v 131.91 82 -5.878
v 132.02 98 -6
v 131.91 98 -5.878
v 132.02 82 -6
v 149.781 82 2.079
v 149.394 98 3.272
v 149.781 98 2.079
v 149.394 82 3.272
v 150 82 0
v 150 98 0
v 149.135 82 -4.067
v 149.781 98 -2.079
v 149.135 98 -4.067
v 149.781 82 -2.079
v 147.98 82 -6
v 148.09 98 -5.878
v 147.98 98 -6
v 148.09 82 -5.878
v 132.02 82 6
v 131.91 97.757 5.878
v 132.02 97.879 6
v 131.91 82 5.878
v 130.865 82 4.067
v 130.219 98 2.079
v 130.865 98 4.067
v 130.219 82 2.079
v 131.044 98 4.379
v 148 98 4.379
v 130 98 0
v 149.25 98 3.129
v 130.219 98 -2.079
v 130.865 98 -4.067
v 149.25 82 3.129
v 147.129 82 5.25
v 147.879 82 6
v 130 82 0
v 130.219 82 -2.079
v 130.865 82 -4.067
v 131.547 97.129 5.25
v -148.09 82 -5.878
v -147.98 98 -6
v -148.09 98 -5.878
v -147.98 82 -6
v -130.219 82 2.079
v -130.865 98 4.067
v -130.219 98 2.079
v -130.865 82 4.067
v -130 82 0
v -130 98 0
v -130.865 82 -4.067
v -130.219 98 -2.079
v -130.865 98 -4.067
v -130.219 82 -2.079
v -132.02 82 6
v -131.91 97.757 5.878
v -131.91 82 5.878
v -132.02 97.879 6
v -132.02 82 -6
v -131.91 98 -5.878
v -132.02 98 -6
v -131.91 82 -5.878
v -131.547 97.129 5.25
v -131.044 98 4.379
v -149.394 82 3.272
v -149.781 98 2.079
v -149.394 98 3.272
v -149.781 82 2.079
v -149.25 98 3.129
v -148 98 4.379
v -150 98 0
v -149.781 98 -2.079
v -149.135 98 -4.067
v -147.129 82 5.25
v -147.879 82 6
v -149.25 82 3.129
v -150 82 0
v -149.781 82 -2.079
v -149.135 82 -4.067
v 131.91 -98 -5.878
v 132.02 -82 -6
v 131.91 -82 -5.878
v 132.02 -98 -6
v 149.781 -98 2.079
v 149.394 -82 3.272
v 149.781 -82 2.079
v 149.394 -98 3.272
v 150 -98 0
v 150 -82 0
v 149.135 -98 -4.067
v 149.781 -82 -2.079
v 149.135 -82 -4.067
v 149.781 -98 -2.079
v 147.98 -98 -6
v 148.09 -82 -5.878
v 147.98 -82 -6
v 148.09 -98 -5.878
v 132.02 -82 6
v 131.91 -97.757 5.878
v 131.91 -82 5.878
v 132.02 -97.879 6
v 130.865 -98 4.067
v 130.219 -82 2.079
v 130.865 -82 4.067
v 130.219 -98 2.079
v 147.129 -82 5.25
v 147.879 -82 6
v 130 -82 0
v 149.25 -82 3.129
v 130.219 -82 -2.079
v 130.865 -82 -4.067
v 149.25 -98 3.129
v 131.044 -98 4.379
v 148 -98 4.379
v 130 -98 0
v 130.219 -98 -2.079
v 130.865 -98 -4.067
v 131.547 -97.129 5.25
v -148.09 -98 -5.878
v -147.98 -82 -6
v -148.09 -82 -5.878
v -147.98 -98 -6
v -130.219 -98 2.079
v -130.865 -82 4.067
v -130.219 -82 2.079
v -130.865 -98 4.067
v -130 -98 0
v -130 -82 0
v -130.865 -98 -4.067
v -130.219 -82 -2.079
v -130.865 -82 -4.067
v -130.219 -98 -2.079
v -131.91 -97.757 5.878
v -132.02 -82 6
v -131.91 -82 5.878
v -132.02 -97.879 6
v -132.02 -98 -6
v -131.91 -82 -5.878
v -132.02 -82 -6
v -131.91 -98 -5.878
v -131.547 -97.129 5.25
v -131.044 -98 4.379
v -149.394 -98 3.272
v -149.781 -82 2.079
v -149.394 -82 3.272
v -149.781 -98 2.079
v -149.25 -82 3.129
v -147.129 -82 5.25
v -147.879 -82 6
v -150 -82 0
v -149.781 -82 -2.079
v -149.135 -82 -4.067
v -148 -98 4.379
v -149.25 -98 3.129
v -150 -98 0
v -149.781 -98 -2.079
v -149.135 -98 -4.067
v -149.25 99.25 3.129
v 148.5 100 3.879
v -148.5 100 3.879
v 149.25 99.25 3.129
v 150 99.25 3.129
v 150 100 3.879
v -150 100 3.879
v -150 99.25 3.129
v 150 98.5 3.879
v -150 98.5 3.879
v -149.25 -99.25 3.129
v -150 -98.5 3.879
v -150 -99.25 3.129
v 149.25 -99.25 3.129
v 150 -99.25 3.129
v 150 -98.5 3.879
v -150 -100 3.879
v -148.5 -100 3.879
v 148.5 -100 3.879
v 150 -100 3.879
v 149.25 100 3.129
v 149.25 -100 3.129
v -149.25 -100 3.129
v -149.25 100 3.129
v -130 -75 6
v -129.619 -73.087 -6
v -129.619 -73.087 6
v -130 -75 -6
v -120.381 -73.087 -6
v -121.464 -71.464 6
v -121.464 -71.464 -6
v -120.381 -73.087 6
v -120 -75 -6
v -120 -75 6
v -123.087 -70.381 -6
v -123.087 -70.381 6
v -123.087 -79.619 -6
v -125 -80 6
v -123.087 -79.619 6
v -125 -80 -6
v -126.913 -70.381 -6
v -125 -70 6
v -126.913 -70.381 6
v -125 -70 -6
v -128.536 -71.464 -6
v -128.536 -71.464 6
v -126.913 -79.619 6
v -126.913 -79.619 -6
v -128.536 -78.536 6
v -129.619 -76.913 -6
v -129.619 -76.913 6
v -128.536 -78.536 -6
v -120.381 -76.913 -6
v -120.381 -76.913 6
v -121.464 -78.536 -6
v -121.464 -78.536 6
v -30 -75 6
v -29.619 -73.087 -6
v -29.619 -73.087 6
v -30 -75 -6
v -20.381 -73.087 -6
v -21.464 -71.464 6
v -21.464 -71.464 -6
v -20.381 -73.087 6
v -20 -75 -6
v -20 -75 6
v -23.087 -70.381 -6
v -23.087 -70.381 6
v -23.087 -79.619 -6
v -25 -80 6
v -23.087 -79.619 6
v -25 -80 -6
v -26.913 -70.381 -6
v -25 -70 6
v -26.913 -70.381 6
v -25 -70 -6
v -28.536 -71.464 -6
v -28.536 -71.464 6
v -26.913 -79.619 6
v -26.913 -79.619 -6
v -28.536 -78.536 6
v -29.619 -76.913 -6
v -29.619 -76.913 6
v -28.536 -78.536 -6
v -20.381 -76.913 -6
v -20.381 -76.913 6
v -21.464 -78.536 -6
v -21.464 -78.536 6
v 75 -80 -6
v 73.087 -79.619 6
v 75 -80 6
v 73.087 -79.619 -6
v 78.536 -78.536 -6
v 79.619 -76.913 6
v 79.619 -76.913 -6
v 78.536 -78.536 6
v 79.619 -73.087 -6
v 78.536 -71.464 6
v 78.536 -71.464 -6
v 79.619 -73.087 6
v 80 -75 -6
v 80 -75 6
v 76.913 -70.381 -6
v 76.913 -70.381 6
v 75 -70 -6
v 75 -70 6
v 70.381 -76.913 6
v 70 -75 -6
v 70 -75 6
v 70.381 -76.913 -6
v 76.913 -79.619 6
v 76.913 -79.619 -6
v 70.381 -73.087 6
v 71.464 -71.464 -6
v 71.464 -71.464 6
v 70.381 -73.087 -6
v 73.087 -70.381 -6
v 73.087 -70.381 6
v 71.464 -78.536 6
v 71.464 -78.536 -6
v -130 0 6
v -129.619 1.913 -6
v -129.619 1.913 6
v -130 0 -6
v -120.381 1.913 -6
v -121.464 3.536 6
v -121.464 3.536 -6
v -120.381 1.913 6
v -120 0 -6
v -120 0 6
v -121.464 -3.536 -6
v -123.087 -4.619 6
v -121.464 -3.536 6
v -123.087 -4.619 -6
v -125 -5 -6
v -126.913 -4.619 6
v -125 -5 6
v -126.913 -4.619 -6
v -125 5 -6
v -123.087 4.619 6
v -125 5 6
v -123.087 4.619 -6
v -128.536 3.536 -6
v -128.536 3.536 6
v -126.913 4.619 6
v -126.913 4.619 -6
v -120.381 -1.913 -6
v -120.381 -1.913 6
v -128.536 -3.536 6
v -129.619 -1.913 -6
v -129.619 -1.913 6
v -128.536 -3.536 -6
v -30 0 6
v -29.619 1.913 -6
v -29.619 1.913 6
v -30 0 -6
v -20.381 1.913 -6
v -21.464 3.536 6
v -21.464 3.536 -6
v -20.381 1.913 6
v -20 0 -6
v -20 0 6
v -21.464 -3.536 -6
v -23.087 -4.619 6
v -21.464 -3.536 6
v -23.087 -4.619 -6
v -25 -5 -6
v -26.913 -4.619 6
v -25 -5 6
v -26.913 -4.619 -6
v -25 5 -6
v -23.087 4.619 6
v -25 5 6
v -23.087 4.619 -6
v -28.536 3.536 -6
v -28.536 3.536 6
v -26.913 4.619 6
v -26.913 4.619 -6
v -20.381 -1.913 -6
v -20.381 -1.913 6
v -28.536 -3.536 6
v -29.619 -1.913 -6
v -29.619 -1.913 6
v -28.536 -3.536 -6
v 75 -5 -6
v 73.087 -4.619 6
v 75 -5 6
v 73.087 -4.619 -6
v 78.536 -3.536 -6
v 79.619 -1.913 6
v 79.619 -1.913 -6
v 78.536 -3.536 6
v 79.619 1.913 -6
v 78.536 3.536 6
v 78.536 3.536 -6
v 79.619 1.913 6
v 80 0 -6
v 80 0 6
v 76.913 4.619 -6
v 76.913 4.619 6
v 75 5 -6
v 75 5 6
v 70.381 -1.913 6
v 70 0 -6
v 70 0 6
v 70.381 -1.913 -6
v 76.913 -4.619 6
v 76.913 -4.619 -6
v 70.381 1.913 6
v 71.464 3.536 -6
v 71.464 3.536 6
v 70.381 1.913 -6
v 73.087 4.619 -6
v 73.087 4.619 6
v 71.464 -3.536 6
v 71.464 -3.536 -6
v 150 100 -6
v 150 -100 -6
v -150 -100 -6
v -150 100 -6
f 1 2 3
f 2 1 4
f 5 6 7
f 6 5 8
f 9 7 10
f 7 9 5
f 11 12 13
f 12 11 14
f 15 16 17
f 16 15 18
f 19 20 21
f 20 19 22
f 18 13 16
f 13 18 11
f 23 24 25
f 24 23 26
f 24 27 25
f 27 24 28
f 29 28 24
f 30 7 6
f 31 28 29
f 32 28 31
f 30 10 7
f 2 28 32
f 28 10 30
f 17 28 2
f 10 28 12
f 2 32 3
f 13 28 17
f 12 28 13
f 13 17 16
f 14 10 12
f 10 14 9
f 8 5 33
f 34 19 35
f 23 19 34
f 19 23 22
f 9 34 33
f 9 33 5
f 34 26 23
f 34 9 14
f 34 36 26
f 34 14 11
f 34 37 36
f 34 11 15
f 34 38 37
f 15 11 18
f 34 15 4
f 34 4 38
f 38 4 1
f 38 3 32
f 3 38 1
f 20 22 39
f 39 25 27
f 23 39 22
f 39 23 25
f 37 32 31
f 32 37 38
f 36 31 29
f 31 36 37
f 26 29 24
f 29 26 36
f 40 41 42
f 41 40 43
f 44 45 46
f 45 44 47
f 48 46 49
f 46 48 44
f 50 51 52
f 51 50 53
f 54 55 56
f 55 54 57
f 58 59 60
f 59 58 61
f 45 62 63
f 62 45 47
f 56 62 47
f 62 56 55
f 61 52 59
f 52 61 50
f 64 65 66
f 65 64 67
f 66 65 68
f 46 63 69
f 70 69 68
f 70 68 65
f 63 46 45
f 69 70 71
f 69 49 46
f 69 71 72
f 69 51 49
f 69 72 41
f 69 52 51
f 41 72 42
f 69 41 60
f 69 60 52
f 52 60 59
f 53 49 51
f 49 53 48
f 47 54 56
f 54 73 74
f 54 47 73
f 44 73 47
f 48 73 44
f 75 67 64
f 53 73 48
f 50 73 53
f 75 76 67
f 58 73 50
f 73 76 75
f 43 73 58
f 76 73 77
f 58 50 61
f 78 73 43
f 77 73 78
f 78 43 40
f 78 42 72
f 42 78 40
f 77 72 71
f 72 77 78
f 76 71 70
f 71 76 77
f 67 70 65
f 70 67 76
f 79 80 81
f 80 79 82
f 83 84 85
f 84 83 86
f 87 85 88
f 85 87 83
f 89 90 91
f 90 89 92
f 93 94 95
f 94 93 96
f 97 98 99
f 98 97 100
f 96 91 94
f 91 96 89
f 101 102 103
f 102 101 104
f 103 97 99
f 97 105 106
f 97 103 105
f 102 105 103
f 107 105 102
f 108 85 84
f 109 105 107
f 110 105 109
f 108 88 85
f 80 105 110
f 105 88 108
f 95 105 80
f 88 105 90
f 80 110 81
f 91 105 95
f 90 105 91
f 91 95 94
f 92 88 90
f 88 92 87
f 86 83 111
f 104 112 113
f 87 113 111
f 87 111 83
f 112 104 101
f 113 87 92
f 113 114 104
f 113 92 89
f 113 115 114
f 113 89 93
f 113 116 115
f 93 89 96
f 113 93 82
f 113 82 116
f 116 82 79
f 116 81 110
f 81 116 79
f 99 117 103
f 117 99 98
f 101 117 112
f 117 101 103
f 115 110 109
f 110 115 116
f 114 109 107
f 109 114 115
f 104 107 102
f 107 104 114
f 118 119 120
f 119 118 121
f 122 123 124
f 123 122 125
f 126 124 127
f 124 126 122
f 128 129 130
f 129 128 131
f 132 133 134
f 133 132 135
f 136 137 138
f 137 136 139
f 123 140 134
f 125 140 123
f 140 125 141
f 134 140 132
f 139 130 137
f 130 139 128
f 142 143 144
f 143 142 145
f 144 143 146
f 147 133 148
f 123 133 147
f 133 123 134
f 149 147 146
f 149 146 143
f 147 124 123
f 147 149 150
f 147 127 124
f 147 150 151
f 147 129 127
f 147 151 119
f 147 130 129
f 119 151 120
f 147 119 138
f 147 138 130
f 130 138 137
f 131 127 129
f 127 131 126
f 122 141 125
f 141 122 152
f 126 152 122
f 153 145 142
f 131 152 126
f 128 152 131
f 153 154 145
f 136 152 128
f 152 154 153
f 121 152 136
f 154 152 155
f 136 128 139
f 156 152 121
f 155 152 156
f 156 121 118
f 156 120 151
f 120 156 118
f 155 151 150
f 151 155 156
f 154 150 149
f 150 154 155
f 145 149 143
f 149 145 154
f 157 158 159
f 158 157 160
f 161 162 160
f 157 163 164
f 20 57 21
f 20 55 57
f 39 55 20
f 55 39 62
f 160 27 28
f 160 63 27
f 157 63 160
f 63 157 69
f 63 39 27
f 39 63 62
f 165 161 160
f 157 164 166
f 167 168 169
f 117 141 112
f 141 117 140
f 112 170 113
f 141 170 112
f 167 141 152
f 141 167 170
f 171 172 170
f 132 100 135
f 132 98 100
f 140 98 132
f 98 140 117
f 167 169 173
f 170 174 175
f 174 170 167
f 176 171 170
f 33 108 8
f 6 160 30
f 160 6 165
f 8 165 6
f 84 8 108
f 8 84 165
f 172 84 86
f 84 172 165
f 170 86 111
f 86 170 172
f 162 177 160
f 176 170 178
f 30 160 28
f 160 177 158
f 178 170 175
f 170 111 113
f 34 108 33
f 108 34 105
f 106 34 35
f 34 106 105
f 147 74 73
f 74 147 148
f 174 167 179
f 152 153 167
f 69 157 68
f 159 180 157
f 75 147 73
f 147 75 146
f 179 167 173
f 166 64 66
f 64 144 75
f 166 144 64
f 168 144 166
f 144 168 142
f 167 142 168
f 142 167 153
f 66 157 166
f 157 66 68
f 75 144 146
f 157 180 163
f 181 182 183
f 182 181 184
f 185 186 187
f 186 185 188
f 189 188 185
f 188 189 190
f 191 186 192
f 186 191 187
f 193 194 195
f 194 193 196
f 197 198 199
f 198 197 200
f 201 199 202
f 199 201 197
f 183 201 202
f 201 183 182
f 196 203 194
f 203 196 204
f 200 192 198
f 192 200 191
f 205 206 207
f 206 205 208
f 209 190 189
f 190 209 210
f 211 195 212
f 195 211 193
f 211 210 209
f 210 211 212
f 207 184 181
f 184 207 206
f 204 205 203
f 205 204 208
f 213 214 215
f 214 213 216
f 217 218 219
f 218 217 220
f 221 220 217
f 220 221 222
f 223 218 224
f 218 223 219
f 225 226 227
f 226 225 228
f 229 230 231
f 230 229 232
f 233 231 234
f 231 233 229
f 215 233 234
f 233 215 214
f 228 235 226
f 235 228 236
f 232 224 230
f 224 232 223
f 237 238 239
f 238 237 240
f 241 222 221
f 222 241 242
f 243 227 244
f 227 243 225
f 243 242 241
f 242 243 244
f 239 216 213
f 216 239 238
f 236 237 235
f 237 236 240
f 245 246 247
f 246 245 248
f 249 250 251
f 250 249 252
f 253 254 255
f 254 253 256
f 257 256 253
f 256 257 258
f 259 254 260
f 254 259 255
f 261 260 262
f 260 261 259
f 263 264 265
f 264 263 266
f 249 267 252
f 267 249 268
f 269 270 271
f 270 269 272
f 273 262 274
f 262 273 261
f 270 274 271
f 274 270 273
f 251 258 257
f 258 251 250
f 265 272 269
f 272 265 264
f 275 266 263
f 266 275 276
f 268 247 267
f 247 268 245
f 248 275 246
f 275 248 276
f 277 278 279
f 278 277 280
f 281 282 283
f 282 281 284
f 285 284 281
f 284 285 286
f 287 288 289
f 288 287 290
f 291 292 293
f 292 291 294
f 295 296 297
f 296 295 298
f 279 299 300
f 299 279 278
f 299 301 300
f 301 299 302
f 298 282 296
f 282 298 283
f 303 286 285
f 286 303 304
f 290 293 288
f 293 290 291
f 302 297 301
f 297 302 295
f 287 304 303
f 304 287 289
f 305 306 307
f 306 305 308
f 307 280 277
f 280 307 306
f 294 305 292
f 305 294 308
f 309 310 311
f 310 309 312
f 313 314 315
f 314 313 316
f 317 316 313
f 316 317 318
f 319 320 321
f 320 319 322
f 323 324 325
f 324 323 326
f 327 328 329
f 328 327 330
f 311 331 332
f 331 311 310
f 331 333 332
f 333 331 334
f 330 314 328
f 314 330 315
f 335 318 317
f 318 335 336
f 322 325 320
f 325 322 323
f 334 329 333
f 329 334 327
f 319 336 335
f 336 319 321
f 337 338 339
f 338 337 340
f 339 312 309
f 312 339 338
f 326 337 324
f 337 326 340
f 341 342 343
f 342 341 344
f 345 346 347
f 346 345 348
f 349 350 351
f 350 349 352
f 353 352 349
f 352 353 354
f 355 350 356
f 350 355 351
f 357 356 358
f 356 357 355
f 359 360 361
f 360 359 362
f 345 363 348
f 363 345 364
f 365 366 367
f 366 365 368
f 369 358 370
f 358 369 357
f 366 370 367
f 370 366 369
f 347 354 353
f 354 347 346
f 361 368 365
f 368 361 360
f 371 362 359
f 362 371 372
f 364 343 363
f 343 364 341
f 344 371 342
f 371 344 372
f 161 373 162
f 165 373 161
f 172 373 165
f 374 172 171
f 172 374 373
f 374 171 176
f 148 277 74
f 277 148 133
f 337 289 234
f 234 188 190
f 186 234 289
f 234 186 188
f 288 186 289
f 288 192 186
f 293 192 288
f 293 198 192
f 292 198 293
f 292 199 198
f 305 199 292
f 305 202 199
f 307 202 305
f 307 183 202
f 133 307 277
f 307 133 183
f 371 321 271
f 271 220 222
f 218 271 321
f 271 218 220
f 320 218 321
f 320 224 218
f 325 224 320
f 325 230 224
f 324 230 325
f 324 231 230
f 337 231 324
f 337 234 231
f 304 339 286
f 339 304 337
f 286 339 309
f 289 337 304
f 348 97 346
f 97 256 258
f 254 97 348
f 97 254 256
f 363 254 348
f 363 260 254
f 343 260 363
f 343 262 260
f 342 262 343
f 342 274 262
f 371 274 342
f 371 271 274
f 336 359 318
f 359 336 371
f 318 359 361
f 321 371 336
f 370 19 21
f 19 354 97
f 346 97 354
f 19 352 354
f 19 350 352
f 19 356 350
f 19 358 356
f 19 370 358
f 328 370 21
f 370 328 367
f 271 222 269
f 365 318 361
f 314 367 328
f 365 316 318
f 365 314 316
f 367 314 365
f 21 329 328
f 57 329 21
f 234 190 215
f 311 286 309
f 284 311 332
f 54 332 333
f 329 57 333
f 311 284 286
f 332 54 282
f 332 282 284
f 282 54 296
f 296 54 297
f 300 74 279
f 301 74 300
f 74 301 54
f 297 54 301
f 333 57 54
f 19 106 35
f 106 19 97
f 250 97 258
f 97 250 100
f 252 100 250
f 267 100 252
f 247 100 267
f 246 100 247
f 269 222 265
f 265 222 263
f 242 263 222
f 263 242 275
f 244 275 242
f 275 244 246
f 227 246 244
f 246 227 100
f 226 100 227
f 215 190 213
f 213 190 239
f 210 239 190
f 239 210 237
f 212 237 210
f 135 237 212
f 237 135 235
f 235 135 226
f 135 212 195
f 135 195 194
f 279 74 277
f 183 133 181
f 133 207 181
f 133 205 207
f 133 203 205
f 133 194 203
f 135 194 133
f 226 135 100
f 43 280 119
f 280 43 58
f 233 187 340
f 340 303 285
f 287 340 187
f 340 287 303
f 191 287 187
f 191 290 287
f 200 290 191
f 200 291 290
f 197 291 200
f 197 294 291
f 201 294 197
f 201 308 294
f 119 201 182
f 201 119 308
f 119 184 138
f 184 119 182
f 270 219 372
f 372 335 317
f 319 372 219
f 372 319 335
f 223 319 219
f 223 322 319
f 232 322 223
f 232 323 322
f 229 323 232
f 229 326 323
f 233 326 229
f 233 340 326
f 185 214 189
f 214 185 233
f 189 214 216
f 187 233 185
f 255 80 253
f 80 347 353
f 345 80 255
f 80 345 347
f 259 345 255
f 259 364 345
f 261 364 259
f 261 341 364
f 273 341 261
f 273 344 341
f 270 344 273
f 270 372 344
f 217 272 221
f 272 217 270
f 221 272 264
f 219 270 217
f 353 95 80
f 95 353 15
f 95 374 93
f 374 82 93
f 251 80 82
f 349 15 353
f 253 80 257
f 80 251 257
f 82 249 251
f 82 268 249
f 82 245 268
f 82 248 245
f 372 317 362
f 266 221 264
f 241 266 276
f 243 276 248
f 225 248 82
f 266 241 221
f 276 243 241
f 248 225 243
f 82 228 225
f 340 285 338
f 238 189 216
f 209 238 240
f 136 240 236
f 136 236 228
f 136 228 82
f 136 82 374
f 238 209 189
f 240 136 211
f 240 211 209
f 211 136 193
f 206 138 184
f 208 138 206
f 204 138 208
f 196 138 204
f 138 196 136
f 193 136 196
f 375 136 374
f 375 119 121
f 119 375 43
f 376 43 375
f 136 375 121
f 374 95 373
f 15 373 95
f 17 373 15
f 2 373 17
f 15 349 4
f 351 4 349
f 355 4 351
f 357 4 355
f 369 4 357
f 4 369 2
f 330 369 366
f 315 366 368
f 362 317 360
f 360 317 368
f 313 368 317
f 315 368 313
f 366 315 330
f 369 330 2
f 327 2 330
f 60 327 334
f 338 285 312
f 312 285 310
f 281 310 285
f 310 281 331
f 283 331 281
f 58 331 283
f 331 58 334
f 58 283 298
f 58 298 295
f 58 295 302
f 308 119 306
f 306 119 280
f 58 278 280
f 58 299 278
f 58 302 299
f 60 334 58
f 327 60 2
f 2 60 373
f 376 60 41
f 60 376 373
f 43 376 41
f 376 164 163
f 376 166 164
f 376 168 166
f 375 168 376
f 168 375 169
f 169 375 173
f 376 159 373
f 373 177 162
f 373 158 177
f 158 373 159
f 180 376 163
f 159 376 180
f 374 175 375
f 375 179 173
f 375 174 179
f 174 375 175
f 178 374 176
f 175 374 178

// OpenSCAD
// Parameters
plate_length = 300; //[150:600:1]
plate_width = 200; //[100:400:1]
plate_thickness = 12; //[6:24:1]
corner_radius = 10; //[5:20:1]
edge_chamfer = 1.5; //[0.5:3:0.5]
hole_diameter = 10; //[5:20:1]
hole_edge_margin = 25; //[12:50:1]
hole_spacing_x = 100; //[50:200:1]
hole_spacing_y = 75; //[40:150:1]
hole_rows = 2; //[1:4:1]
hole_cols = 3; //[1:5:1]
hole_clearance_z = 2; //[1:5:1]
chamfer_cutter_extra = 2; //[1:6:1]

// Base shapes
module tooling_plate_body() {
  cube([plate_length, plate_width, plate_thickness], center=true);
}

module corner_radius_cut_cyl_base() {
  rotate([90, 0, 0])
    cylinder(r=corner_radius, h=plate_thickness + 2*hole_clearance_z, center=true);
}

module corner_radius_cut_box_base() {
  cube([2*corner_radius, 2*corner_radius, plate_thickness + 2*hole_clearance_z], center=true);
}

module edge_chamfer_cutter_x_base() {
  cube([plate_length + 2*chamfer_cutter_extra, edge_chamfer*2, edge_chamfer*2], center=true);
}

module edge_chamfer_cutter_y_base() {
  cube([edge_chamfer*2, plate_width + 2*chamfer_cutter_extra, edge_chamfer*2], center=true);
}

module mounting_hole_cutter_base() {
  cylinder(r=hole_diameter/2, h=plate_thickness + 2*hole_clearance_z, center=true);
}

// Operations
module corner_radius_cut_quadrant() {
  intersection() {
    corner_radius_cut_cyl_base();
    corner_radius_cut_box_base();
  }
}

module corner_radius_cuts_all() {
  union() {
    translate([plate_length/2 - corner_radius, plate_width/2 - corner_radius, 0])
      corner_radius_cut_quadrant();
    translate([-plate_length/2 + corner_radius, plate_width/2 - corner_radius, 0])
      corner_radius_cut_quadrant();
    translate([plate_length/2 - corner_radius, -plate_width/2 + corner_radius, 0])
      corner_radius_cut_quadrant();
    translate([-plate_length/2 + corner_radius, -plate_width/2 + corner_radius, 0])
      corner_radius_cut_quadrant();
  }
}

module edge_chamfer() {
  union() {
    translate([0, plate_width/2 - edge_chamfer/2, plate_thickness/2 - edge_chamfer/2])
      rotate([45, 0, 0]) edge_chamfer_cutter_x_base();
    translate([0, -plate_width/2 + edge_chamfer/2, plate_thickness/2 - edge_chamfer/2])
      rotate([45, 0, 0]) edge_chamfer_cutter_x_base();
    translate([plate_length/2 - edge_chamfer/2, 0, plate_thickness/2 - edge_chamfer/2])
      rotate([0, 45, 0]) edge_chamfer_cutter_y_base();
    translate([-plate_length/2 + edge_chamfer/2, 0, plate_thickness/2 - edge_chamfer/2])
      rotate([0, 45, 0]) edge_chamfer_cutter_y_base();
  }
}

module mounting_holes_pattern() {
  union() {
    for (row = [0:hole_rows-1]) {
      for (col = [0:hole_cols-1]) {
        translate([-plate_length/2 + hole_edge_margin + col*hole_spacing_x,
                   -plate_width/2 + hole_edge_margin + row*hole_spacing_y, 0])
          mounting_hole_cutter_base();
      }
    }
  }
}

// Final model
difference() {
  tooling_plate_body();
  corner_radius_cuts_all();
  edge_chamfer();
  mounting_holes_pattern();
}
